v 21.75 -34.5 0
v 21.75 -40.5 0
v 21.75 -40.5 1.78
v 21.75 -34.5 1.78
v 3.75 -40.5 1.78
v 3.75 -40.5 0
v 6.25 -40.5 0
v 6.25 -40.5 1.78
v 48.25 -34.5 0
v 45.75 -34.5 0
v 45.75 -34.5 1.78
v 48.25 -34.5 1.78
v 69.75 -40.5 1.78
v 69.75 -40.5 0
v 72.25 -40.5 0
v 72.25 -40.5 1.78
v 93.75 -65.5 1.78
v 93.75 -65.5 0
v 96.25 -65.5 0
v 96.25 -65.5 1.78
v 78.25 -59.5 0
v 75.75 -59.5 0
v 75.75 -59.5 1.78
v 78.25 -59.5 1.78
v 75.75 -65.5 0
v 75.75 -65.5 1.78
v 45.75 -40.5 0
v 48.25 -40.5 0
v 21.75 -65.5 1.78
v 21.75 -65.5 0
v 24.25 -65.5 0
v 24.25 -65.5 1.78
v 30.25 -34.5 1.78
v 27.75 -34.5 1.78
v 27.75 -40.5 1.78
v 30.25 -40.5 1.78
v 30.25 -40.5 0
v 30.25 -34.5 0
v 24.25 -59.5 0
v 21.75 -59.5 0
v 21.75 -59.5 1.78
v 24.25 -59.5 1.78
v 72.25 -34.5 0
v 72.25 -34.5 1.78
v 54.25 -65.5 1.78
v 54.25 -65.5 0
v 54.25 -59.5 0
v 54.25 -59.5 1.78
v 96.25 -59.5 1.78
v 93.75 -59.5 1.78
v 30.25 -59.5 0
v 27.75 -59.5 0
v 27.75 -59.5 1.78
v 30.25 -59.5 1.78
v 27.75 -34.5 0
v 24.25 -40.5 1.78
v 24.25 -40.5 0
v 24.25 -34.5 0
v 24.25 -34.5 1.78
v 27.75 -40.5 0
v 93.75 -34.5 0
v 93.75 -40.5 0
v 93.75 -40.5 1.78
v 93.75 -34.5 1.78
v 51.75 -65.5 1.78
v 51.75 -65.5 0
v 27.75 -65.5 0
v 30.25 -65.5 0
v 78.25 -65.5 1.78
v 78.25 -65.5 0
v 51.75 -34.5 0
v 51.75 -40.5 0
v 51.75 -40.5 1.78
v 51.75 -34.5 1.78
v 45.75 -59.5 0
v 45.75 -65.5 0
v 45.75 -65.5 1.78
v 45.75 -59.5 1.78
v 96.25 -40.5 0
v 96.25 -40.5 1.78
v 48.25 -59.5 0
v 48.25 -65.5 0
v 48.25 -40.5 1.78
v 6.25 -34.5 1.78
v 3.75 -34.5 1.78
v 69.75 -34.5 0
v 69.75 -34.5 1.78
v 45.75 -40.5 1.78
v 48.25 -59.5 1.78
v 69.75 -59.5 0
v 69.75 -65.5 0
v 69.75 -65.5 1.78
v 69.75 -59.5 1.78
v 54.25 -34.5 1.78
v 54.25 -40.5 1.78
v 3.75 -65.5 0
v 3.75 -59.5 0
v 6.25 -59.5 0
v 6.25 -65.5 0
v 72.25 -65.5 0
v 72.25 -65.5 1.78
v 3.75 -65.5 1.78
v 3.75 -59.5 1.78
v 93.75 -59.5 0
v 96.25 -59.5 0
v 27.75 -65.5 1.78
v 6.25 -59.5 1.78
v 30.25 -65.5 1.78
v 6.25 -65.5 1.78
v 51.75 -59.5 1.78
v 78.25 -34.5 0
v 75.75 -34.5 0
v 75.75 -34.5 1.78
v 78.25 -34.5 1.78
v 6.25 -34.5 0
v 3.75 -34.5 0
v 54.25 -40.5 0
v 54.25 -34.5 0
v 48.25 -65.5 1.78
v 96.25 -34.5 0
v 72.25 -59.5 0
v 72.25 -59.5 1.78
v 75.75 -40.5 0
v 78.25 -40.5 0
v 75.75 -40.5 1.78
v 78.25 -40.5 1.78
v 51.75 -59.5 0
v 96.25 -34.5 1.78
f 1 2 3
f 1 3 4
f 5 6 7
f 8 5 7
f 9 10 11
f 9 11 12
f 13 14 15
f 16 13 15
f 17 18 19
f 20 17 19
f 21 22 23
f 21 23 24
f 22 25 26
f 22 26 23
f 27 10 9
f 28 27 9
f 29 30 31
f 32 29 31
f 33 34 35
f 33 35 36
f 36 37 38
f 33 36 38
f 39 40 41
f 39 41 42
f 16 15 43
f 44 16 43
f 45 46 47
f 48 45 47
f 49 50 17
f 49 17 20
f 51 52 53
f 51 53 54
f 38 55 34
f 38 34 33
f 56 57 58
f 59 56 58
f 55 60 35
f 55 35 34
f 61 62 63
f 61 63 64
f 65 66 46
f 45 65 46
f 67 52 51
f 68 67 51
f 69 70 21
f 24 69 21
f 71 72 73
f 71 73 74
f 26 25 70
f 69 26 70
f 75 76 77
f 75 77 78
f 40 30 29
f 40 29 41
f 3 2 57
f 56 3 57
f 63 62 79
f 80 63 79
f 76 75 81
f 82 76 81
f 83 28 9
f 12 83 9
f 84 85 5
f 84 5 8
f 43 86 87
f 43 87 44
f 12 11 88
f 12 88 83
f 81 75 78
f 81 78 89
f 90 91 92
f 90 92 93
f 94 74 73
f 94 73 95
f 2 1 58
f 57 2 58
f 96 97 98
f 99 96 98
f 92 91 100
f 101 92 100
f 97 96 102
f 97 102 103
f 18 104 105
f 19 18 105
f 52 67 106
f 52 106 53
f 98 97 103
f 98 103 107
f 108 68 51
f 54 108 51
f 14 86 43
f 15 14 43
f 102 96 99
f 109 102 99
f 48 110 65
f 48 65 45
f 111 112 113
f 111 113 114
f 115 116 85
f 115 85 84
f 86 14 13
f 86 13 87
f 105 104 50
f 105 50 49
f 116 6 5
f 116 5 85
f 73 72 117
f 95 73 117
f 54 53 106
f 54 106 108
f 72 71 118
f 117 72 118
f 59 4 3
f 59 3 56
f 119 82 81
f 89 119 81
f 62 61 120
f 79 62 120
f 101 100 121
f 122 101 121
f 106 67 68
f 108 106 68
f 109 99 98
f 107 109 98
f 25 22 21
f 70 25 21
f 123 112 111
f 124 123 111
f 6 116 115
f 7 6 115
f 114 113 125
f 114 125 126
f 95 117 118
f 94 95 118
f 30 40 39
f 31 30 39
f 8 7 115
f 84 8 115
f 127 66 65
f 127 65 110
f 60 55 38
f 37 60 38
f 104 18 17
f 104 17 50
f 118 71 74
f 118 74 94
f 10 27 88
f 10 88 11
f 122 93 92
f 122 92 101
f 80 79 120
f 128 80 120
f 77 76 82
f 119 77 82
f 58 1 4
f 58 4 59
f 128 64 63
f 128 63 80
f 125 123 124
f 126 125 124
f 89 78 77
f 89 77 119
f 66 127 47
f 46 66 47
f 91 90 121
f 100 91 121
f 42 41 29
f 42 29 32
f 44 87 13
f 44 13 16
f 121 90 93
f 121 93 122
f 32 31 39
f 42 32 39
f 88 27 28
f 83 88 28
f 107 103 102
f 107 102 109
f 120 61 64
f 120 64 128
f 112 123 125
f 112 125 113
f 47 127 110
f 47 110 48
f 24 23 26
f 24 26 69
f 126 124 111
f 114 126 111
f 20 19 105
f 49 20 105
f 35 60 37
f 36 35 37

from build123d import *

# Parameters (mm, degrees)
SKETCH1_W              = 2.5
SKETCH1_H              = 6
BOSS_EXTRUDE1_DEPTH    = 1.78
BOSS_EXTRUDE1_2_DEPTH  = 1.78
BOSS_EXTRUDE1_3_DEPTH  = 1.78
BOSS_EXTRUDE1_4_DEPTH  = 1.78
BOSS_EXTRUDE1_5_DEPTH  = 1.78
BOSS_EXTRUDE1_6_DEPTH  = 1.78
BOSS_EXTRUDE1_7_DEPTH  = 1.78
BOSS_EXTRUDE1_8_DEPTH  = 1.78
BOSS_EXTRUDE1_9_DEPTH  = 1.78
BOSS_EXTRUDE1_10_DEPTH = 1.78
BOSS_EXTRUDE1_11_DEPTH = 1.78
BOSS_EXTRUDE1_12_DEPTH = 1.78
BOSS_EXTRUDE1_13_DEPTH = 1.78
BOSS_EXTRUDE1_14_DEPTH = 1.78
BOSS_EXTRUDE1_15_DEPTH = 1.78
BOSS_EXTRUDE1_16_DEPTH = 1.78


with BuildPart() as part:
    # Sketch1 → Boss-Extrude1 (new body)
    with BuildSketch(Plane.XY):
        with Locations((23, -37.5)):
            Rectangle(SKETCH1_W, SKETCH1_H)
    extrude(amount=BOSS_EXTRUDE1_DEPTH)


with BuildPart() as body_2:
    # Sketch1 → Boss-Extrude1 2 (new body)
    with BuildSketch(Plane.XY):
        with Locations((5, -37.5)):
            Rectangle(SKETCH1_W, SKETCH1_H)
    extrude(amount=BOSS_EXTRUDE1_2_DEPTH)


with BuildPart() as body_3:
    # Sketch1 → Boss-Extrude1 3 (new body)
    with BuildSketch(Plane.XY):
        with Locations((5, -62.5)):
            Rectangle(SKETCH1_W, SKETCH1_H)
    extrude(amount=BOSS_EXTRUDE1_3_DEPTH)


with BuildPart() as body_4:
    # Sketch1 → Boss-Extrude1 4 (new body)
    with BuildSketch(Plane.XY):
        with Locations((23, -62.5)):
            Rectangle(SKETCH1_W, SKETCH1_H)
    extrude(amount=BOSS_EXTRUDE1_4_DEPTH)


with BuildPart() as body_5:
    # Sketch1 → Boss-Extrude1 5 (new body)
    with BuildSketch(Plane.XY):
        with Locations((47, -37.5)):
            Rectangle(SKETCH1_W, SKETCH1_H)
    extrude(amount=BOSS_EXTRUDE1_5_DEPTH)


with BuildPart() as body_6:
    # Sketch1 → Boss-Extrude1 6 (new body)
    with BuildSketch(Plane.XY):
        with Locations((29, -37.5)):
            Rectangle(SKETCH1_W, SKETCH1_H)
    extrude(amount=BOSS_EXTRUDE1_6_DEPTH)


with BuildPart() as body_7:
    # Sketch1 → Boss-Extrude1 7 (new body)
    with BuildSketch(Plane.XY):
        with Locations((29, -62.5)):
            Rectangle(SKETCH1_W, SKETCH1_H)
    extrude(amount=BOSS_EXTRUDE1_7_DEPTH)


with BuildPart() as body_8:
    # Sketch1 → Boss-Extrude1 8 (new body)
    with BuildSketch(Plane.XY):
        with Locations((47, -62.5)):
            Rectangle(SKETCH1_W, SKETCH1_H)
    extrude(amount=BOSS_EXTRUDE1_8_DEPTH)


with BuildPart() as body_9:
    # Sketch1 → Boss-Extrude1 9 (new body)
    with BuildSketch(Plane.XY):
        with Locations((71, -37.5)):
            Rectangle(SKETCH1_W, SKETCH1_H)
    extrude(amount=BOSS_EXTRUDE1_9_DEPTH)


with BuildPart() as body_10:
    # Sketch1 → Boss-Extrude1 10 (new body)
    with BuildSketch(Plane.XY):
        with Locations((53, -37.5)):
            Rectangle(SKETCH1_W, SKETCH1_H)
    extrude(amount=BOSS_EXTRUDE1_10_DEPTH)


with BuildPart() as body_11:
    # Sketch1 → Boss-Extrude1 11 (new body)
    with BuildSketch(Plane.XY):
        with Locations((53, -62.5)):
            Rectangle(SKETCH1_W, SKETCH1_H)
    extrude(amount=BOSS_EXTRUDE1_11_DEPTH)


with BuildPart() as body_12:
    # Sketch1 → Boss-Extrude1 12 (new body)
    with BuildSketch(Plane.XY):
        with Locations((71, -62.5)):
            Rectangle(SKETCH1_W, SKETCH1_H)
    extrude(amount=BOSS_EXTRUDE1_12_DEPTH)


with BuildPart() as body_13:
    # Sketch1 → Boss-Extrude1 13 (new body)
    with BuildSketch(Plane.XY):
        with Locations((95, -37.5)):
            Rectangle(SKETCH1_W, SKETCH1_H)
    extrude(amount=BOSS_EXTRUDE1_13_DEPTH)


with BuildPart() as body_14:
    # Sketch1 → Boss-Extrude1 14 (new body)
    with BuildSketch(Plane.XY):
        with Locations((77, -37.5)):
            Rectangle(SKETCH1_W, SKETCH1_H)
    extrude(amount=BOSS_EXTRUDE1_14_DEPTH)


with BuildPart() as body_15:
    # Sketch1 → Boss-Extrude1 15 (new body)
    with BuildSketch(Plane.XY):
        with Locations((77, -62.5)):
            Rectangle(SKETCH1_W, SKETCH1_H)
    extrude(amount=BOSS_EXTRUDE1_15_DEPTH)


with BuildPart() as body_16:
    # Sketch1 → Boss-Extrude1 16 (new body)
    with BuildSketch(Plane.XY):
        with Locations((95, -62.5)):
            Rectangle(SKETCH1_W, SKETCH1_H)
    extrude(amount=BOSS_EXTRUDE1_16_DEPTH)


solid = Compound([part.part, body_2.part, body_3.part, body_4.part, body_5.part, body_6.part, body_7.part, body_8.part, body_9.part, body_10.part, body_11.part, body_12.part, body_13.part, body_14.part, body_15.part, body_16.part])
